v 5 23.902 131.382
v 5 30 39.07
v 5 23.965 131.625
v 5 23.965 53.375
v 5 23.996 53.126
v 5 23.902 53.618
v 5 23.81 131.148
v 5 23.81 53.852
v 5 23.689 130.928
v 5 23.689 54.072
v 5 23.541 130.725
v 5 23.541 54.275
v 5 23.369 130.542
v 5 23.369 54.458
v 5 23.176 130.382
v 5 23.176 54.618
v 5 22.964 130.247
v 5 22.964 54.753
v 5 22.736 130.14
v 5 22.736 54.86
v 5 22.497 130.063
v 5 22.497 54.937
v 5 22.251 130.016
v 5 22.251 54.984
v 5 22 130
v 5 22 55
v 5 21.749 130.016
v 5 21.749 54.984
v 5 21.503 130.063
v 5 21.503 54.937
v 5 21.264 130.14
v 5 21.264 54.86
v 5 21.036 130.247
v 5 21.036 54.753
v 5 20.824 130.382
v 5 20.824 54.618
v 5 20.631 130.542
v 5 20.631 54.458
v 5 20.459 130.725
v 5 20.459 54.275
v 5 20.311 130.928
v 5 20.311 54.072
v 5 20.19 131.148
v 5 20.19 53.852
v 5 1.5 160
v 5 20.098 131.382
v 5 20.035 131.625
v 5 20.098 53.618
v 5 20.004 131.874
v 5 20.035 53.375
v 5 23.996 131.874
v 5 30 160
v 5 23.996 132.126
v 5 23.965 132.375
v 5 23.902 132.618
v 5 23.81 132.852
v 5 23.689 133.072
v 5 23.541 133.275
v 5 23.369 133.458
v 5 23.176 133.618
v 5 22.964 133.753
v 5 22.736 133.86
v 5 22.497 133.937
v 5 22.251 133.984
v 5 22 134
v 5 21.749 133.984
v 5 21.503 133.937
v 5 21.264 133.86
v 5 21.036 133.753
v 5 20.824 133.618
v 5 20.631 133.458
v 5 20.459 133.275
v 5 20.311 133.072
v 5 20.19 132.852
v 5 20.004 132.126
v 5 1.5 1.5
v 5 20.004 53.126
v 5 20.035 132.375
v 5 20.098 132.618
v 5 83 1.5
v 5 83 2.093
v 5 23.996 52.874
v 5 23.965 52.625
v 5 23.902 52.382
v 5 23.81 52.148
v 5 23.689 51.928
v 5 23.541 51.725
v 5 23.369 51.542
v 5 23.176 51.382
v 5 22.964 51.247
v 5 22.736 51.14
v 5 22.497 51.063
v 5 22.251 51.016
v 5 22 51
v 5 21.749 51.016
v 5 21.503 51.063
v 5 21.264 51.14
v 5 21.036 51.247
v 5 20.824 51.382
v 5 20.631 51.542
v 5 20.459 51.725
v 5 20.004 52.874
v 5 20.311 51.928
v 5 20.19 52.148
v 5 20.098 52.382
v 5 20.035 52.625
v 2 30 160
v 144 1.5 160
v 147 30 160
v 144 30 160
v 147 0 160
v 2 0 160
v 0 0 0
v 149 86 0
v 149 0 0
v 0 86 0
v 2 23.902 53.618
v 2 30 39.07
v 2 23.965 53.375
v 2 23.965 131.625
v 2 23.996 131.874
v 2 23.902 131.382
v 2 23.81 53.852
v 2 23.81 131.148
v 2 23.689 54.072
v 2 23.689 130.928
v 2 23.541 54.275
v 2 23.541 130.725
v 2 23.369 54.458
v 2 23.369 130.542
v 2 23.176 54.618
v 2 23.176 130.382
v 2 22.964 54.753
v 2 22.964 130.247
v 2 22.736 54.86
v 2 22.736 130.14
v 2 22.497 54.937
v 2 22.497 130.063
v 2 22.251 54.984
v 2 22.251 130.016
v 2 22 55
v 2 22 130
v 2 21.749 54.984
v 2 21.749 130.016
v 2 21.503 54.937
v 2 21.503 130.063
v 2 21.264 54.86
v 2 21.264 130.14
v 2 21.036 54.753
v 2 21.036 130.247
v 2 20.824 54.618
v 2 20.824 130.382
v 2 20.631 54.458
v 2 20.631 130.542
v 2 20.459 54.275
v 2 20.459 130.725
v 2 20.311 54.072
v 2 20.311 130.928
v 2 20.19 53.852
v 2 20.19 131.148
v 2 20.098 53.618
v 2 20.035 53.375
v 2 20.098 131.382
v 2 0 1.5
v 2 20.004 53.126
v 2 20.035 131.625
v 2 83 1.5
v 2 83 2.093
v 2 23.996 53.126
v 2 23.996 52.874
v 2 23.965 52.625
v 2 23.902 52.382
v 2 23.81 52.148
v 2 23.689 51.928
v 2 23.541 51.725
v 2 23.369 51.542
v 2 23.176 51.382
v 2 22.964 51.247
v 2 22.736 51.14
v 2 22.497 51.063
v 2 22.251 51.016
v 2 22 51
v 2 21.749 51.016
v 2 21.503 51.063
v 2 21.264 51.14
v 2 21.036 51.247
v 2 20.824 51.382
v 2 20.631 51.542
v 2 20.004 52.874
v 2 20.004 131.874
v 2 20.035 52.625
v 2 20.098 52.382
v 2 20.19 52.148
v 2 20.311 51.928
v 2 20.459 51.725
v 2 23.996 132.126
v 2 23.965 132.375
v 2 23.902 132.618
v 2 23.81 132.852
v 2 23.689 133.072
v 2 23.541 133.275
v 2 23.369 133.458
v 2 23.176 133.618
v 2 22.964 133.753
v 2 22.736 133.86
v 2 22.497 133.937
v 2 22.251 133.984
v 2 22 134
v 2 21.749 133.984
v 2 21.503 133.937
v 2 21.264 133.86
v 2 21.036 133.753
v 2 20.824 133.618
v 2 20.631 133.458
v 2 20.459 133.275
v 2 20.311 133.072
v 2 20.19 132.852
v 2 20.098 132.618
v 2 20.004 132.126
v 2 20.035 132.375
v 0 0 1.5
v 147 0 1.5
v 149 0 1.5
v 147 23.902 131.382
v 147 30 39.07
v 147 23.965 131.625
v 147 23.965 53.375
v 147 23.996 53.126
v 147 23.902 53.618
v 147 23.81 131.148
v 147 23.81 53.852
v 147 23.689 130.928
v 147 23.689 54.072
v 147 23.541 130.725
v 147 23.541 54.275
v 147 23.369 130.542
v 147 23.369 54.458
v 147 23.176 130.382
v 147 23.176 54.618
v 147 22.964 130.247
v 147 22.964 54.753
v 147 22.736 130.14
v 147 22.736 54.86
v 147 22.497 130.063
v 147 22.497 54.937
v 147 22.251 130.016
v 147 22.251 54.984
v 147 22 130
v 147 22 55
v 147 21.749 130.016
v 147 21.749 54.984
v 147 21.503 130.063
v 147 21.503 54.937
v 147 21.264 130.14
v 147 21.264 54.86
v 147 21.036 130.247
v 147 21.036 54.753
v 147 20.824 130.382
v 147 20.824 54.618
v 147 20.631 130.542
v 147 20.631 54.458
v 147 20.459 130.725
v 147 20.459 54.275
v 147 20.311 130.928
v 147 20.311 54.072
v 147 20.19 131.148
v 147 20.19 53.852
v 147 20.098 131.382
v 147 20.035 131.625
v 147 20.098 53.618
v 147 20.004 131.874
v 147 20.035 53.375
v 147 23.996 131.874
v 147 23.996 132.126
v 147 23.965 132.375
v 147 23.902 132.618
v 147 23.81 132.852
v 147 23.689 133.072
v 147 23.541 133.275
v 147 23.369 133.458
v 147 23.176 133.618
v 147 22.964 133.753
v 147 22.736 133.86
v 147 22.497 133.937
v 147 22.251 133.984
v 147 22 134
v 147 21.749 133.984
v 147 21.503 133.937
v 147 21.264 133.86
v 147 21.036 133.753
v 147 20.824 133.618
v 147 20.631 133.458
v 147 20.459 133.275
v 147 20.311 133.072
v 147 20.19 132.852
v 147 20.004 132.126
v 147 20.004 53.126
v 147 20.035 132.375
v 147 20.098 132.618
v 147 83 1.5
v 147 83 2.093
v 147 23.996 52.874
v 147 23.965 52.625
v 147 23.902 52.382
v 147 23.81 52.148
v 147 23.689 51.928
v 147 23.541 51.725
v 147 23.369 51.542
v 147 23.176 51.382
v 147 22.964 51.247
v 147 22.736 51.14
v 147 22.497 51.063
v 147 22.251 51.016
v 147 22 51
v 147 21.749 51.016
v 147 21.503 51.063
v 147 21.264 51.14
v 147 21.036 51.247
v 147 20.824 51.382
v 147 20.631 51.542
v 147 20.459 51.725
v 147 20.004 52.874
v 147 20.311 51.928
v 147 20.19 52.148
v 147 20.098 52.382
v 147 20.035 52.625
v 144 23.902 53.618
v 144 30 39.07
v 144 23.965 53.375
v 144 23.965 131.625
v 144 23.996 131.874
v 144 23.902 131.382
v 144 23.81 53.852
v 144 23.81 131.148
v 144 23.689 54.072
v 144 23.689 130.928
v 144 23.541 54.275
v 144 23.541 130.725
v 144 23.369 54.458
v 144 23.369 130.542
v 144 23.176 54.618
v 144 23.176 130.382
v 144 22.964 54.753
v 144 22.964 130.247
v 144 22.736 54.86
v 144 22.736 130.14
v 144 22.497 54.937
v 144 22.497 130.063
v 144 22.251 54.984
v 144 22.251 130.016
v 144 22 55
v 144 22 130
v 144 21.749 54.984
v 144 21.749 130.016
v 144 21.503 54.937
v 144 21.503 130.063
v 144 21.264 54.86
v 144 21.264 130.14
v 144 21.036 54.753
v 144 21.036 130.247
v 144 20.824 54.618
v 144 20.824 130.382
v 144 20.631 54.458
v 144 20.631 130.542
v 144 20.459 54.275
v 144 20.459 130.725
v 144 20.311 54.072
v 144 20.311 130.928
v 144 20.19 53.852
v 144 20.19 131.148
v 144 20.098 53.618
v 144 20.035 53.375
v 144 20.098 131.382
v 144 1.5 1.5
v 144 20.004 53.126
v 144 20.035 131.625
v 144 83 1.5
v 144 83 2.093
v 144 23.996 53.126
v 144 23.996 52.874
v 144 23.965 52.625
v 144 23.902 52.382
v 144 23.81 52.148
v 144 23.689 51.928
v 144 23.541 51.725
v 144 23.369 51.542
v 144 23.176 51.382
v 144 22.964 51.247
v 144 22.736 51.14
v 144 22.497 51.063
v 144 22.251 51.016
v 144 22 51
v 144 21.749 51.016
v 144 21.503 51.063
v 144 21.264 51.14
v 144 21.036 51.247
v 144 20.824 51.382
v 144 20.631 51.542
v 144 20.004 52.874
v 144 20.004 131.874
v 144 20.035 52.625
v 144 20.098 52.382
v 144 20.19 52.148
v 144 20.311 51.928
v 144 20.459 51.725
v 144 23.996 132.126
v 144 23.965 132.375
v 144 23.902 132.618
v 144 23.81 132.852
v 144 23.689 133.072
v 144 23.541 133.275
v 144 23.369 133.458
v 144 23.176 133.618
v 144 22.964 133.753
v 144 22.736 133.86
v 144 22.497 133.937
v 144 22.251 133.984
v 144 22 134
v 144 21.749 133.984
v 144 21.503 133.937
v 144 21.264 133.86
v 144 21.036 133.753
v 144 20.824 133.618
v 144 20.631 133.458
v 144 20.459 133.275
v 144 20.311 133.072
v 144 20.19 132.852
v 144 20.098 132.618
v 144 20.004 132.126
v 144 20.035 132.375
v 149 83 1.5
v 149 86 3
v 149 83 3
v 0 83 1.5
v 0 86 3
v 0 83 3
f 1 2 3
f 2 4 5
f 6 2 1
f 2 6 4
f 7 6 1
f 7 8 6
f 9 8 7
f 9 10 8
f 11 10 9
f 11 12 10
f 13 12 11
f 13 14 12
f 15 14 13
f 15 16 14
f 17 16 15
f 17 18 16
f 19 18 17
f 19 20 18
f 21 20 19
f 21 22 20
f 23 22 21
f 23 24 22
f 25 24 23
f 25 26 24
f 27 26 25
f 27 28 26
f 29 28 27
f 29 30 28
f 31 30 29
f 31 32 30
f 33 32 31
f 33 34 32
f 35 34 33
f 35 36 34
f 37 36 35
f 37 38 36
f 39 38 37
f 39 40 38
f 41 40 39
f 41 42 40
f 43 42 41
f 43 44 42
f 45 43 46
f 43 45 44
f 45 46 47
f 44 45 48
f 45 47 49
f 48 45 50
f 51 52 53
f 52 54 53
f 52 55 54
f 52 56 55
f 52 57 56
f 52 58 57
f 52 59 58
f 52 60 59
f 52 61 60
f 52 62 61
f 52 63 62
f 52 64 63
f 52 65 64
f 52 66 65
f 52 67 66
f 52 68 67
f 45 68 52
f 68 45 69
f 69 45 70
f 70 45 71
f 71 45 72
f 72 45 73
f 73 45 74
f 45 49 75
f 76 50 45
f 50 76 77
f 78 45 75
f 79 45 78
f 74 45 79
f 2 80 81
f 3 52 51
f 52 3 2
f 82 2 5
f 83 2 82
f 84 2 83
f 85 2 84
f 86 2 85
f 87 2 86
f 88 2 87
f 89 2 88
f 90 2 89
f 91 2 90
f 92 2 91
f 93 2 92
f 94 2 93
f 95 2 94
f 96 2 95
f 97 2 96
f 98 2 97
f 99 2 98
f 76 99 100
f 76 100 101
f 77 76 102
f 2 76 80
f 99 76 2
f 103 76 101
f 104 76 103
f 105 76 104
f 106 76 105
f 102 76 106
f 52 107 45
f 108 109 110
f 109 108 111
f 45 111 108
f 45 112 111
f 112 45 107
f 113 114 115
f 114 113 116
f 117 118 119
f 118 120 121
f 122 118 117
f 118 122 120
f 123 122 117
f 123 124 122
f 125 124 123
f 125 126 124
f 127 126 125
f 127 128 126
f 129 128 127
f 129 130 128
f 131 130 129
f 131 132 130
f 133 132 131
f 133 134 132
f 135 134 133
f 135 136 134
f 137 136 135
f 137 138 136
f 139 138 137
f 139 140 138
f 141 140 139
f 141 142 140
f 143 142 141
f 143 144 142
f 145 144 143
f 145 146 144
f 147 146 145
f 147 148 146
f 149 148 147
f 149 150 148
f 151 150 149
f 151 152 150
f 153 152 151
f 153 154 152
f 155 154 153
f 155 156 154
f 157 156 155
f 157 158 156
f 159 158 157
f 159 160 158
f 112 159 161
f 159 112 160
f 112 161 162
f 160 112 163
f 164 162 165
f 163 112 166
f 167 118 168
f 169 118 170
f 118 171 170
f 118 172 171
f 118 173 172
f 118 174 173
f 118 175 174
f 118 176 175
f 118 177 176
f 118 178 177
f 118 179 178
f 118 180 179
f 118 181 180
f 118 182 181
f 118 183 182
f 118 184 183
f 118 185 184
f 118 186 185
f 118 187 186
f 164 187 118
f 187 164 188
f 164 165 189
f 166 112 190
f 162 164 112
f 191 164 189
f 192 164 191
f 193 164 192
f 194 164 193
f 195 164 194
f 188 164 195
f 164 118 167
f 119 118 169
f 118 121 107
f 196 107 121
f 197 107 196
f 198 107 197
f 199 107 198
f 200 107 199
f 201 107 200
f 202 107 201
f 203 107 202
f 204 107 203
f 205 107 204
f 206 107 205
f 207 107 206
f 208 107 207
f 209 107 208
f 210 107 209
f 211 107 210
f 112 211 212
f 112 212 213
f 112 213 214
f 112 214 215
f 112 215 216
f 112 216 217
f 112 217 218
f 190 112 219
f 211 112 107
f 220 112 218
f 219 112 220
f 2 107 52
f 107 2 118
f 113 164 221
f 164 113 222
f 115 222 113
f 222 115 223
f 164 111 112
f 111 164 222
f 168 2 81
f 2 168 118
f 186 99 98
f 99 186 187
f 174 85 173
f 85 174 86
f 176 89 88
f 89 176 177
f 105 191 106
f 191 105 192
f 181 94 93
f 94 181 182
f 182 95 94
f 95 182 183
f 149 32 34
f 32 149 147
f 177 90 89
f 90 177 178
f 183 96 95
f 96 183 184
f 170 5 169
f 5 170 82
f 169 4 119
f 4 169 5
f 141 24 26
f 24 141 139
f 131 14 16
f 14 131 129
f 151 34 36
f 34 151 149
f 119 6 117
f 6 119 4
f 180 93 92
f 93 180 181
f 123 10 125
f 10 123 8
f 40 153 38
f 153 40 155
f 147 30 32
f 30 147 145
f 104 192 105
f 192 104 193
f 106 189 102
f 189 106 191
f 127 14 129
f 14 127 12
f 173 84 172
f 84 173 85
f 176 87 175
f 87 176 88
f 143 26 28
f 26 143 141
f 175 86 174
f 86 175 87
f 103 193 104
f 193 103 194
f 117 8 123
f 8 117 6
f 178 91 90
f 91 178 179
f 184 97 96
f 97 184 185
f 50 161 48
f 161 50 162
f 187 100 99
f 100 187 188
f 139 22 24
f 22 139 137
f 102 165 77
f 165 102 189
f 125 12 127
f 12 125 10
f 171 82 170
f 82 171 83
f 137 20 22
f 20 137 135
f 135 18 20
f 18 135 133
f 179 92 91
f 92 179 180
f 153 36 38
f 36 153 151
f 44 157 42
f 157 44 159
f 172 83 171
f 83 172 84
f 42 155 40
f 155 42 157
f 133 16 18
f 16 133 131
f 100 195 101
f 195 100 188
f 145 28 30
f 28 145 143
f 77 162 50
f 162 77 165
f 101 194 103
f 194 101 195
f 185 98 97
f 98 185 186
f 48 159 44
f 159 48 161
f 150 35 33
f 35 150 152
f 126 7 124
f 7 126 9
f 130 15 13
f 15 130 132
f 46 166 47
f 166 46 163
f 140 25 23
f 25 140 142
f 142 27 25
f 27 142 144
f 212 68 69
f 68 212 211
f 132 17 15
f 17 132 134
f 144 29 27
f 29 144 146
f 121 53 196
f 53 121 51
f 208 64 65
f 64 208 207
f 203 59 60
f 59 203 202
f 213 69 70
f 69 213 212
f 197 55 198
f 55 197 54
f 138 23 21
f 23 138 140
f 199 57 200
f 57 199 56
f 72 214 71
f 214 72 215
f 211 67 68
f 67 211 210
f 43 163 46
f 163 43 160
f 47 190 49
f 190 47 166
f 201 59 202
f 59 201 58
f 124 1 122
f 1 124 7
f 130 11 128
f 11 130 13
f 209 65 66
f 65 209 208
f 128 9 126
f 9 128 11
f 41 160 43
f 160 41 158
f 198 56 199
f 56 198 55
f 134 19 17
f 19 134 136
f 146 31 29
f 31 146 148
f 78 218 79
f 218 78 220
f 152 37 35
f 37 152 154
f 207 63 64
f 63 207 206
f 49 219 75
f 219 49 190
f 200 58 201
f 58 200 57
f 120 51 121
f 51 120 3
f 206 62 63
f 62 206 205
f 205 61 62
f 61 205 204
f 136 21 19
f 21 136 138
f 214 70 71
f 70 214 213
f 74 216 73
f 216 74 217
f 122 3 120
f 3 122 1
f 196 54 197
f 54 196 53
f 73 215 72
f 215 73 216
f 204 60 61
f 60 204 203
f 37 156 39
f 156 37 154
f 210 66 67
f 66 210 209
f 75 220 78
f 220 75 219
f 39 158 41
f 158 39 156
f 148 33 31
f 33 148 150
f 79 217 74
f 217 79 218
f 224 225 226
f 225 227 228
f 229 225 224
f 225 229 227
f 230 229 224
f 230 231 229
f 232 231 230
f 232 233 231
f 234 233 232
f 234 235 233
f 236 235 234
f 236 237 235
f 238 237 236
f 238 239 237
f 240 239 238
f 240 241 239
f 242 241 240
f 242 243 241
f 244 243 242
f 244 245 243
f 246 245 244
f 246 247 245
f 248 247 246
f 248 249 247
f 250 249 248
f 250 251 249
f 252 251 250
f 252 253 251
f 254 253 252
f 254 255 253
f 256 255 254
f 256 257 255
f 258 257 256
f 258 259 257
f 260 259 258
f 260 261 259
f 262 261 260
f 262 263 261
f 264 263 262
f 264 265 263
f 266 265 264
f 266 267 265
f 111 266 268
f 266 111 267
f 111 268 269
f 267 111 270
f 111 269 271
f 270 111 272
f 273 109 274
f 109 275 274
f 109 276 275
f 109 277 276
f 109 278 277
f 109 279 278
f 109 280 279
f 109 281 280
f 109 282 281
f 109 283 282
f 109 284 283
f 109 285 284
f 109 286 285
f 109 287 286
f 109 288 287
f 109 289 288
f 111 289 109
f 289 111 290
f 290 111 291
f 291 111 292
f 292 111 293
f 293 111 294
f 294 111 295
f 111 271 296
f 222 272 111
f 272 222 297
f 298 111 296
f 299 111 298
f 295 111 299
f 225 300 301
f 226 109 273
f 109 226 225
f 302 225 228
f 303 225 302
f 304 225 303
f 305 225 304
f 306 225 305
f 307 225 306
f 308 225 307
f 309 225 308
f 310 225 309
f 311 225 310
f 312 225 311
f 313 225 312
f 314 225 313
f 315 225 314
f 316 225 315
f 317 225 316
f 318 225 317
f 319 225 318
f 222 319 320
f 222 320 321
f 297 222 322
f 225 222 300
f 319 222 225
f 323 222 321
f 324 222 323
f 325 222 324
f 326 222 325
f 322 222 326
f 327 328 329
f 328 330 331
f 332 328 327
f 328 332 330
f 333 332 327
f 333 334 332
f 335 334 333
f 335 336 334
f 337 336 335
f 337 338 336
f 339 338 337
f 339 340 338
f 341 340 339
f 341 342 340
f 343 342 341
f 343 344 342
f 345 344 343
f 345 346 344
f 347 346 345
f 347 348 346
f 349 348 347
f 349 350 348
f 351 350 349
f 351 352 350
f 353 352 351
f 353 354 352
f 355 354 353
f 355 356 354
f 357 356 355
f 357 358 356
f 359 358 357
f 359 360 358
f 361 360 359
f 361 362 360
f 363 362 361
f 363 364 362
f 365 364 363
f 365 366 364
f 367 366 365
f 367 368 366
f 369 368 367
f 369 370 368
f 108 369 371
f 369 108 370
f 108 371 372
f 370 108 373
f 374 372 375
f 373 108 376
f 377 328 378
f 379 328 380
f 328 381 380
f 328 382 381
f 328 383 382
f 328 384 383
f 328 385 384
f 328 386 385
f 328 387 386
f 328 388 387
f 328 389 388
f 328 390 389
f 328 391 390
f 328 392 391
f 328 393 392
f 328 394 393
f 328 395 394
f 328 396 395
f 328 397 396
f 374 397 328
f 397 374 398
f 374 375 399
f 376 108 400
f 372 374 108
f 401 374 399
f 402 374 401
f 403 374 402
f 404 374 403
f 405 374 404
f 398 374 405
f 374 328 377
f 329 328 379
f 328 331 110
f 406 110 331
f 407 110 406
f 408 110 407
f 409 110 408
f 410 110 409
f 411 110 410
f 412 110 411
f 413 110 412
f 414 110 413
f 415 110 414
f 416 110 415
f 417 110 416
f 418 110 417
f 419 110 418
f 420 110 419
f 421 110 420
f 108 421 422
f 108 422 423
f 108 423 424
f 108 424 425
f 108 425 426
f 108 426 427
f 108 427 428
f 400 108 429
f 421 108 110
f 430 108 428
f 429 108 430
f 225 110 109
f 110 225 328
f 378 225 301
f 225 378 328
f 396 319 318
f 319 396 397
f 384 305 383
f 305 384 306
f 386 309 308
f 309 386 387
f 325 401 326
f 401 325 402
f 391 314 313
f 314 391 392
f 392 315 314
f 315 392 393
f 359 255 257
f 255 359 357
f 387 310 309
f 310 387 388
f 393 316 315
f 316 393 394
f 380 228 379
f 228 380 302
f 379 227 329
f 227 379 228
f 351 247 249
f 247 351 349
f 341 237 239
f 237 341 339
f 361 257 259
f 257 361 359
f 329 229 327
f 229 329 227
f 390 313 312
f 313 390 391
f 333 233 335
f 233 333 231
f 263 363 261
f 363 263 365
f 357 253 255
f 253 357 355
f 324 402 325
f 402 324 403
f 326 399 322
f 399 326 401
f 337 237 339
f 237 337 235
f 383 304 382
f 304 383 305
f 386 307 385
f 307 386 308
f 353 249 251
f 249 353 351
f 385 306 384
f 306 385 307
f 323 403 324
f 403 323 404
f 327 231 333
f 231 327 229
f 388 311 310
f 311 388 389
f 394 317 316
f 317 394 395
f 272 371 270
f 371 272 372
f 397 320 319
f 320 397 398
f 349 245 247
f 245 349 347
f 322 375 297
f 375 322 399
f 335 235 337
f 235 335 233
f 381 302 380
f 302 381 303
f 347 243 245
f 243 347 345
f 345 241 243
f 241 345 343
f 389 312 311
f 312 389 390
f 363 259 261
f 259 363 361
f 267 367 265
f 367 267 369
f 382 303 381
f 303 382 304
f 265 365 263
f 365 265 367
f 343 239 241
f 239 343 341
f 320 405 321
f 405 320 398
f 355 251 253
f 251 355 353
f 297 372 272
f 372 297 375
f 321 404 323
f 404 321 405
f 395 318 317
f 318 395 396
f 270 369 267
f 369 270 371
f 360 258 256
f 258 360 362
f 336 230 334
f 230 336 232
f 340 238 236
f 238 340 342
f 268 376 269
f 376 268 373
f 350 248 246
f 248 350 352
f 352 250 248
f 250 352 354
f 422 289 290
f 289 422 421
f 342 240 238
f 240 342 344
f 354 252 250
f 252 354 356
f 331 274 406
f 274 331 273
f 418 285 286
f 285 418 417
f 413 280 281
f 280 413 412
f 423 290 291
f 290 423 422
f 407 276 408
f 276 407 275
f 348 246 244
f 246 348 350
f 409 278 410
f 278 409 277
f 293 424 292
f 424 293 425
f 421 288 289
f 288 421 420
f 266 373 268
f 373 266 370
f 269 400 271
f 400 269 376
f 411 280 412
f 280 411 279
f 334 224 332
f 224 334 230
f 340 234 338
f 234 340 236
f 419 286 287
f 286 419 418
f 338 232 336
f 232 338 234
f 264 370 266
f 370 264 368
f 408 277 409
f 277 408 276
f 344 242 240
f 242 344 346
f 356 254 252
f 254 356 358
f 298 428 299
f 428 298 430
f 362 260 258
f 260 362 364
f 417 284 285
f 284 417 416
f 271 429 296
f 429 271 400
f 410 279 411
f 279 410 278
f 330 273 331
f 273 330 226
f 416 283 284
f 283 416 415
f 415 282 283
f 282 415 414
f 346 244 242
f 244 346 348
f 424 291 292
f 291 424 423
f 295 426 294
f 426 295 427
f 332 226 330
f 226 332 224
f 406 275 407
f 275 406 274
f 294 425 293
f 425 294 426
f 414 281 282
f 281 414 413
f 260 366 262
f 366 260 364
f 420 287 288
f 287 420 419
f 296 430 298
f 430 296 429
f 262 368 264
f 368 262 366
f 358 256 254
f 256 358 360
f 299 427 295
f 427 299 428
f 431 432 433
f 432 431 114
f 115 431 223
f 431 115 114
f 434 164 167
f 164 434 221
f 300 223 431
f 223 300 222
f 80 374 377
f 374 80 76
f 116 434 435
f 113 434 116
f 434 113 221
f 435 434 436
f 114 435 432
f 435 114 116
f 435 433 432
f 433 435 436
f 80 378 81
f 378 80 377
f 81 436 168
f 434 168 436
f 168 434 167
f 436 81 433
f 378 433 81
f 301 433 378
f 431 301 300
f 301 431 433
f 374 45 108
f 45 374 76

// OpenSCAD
$fa = 1;
$fs = 0.5;
$fn = 50;

thk=1.5;

// Front plate sizes
front_wd=149;
front_ht=86;
// Shelf sizes
shelf_wd=145;
shelf_dp=160;
shelf_inset=(front_wd-shelf_wd)/2;

module side() {
  difference() {
    union() {
      cube([thk*2,30,shelf_dp]);
      rotate([0,90,0]) linear_extrude(thk*2) polygon(points=[[0,0],[-60,0],[0,front_ht]]);
    }
    translate([-1,22,53]) rotate([0,90,0]) cylinder(h=4*thk,r=2);
    translate([-1,22,132]) rotate([0,90,0]) cylinder(h=4*thk,r=2);
  }
}

union() {
  // FRONT PLATE
  cube([front_wd,front_ht,thk]); // front
  translate([0,front_ht-2*thk,0]) cube([front_wd,2*thk,2*thk]); // top strengther
  // SHELF
  translate([shelf_inset,0,0]) cube([shelf_wd,thk,shelf_dp]); // bottom
  translate([shelf_inset,0,0]) side(); // side
  translate([front_wd-thk*2-shelf_inset,0,0]) side(); // side
}
